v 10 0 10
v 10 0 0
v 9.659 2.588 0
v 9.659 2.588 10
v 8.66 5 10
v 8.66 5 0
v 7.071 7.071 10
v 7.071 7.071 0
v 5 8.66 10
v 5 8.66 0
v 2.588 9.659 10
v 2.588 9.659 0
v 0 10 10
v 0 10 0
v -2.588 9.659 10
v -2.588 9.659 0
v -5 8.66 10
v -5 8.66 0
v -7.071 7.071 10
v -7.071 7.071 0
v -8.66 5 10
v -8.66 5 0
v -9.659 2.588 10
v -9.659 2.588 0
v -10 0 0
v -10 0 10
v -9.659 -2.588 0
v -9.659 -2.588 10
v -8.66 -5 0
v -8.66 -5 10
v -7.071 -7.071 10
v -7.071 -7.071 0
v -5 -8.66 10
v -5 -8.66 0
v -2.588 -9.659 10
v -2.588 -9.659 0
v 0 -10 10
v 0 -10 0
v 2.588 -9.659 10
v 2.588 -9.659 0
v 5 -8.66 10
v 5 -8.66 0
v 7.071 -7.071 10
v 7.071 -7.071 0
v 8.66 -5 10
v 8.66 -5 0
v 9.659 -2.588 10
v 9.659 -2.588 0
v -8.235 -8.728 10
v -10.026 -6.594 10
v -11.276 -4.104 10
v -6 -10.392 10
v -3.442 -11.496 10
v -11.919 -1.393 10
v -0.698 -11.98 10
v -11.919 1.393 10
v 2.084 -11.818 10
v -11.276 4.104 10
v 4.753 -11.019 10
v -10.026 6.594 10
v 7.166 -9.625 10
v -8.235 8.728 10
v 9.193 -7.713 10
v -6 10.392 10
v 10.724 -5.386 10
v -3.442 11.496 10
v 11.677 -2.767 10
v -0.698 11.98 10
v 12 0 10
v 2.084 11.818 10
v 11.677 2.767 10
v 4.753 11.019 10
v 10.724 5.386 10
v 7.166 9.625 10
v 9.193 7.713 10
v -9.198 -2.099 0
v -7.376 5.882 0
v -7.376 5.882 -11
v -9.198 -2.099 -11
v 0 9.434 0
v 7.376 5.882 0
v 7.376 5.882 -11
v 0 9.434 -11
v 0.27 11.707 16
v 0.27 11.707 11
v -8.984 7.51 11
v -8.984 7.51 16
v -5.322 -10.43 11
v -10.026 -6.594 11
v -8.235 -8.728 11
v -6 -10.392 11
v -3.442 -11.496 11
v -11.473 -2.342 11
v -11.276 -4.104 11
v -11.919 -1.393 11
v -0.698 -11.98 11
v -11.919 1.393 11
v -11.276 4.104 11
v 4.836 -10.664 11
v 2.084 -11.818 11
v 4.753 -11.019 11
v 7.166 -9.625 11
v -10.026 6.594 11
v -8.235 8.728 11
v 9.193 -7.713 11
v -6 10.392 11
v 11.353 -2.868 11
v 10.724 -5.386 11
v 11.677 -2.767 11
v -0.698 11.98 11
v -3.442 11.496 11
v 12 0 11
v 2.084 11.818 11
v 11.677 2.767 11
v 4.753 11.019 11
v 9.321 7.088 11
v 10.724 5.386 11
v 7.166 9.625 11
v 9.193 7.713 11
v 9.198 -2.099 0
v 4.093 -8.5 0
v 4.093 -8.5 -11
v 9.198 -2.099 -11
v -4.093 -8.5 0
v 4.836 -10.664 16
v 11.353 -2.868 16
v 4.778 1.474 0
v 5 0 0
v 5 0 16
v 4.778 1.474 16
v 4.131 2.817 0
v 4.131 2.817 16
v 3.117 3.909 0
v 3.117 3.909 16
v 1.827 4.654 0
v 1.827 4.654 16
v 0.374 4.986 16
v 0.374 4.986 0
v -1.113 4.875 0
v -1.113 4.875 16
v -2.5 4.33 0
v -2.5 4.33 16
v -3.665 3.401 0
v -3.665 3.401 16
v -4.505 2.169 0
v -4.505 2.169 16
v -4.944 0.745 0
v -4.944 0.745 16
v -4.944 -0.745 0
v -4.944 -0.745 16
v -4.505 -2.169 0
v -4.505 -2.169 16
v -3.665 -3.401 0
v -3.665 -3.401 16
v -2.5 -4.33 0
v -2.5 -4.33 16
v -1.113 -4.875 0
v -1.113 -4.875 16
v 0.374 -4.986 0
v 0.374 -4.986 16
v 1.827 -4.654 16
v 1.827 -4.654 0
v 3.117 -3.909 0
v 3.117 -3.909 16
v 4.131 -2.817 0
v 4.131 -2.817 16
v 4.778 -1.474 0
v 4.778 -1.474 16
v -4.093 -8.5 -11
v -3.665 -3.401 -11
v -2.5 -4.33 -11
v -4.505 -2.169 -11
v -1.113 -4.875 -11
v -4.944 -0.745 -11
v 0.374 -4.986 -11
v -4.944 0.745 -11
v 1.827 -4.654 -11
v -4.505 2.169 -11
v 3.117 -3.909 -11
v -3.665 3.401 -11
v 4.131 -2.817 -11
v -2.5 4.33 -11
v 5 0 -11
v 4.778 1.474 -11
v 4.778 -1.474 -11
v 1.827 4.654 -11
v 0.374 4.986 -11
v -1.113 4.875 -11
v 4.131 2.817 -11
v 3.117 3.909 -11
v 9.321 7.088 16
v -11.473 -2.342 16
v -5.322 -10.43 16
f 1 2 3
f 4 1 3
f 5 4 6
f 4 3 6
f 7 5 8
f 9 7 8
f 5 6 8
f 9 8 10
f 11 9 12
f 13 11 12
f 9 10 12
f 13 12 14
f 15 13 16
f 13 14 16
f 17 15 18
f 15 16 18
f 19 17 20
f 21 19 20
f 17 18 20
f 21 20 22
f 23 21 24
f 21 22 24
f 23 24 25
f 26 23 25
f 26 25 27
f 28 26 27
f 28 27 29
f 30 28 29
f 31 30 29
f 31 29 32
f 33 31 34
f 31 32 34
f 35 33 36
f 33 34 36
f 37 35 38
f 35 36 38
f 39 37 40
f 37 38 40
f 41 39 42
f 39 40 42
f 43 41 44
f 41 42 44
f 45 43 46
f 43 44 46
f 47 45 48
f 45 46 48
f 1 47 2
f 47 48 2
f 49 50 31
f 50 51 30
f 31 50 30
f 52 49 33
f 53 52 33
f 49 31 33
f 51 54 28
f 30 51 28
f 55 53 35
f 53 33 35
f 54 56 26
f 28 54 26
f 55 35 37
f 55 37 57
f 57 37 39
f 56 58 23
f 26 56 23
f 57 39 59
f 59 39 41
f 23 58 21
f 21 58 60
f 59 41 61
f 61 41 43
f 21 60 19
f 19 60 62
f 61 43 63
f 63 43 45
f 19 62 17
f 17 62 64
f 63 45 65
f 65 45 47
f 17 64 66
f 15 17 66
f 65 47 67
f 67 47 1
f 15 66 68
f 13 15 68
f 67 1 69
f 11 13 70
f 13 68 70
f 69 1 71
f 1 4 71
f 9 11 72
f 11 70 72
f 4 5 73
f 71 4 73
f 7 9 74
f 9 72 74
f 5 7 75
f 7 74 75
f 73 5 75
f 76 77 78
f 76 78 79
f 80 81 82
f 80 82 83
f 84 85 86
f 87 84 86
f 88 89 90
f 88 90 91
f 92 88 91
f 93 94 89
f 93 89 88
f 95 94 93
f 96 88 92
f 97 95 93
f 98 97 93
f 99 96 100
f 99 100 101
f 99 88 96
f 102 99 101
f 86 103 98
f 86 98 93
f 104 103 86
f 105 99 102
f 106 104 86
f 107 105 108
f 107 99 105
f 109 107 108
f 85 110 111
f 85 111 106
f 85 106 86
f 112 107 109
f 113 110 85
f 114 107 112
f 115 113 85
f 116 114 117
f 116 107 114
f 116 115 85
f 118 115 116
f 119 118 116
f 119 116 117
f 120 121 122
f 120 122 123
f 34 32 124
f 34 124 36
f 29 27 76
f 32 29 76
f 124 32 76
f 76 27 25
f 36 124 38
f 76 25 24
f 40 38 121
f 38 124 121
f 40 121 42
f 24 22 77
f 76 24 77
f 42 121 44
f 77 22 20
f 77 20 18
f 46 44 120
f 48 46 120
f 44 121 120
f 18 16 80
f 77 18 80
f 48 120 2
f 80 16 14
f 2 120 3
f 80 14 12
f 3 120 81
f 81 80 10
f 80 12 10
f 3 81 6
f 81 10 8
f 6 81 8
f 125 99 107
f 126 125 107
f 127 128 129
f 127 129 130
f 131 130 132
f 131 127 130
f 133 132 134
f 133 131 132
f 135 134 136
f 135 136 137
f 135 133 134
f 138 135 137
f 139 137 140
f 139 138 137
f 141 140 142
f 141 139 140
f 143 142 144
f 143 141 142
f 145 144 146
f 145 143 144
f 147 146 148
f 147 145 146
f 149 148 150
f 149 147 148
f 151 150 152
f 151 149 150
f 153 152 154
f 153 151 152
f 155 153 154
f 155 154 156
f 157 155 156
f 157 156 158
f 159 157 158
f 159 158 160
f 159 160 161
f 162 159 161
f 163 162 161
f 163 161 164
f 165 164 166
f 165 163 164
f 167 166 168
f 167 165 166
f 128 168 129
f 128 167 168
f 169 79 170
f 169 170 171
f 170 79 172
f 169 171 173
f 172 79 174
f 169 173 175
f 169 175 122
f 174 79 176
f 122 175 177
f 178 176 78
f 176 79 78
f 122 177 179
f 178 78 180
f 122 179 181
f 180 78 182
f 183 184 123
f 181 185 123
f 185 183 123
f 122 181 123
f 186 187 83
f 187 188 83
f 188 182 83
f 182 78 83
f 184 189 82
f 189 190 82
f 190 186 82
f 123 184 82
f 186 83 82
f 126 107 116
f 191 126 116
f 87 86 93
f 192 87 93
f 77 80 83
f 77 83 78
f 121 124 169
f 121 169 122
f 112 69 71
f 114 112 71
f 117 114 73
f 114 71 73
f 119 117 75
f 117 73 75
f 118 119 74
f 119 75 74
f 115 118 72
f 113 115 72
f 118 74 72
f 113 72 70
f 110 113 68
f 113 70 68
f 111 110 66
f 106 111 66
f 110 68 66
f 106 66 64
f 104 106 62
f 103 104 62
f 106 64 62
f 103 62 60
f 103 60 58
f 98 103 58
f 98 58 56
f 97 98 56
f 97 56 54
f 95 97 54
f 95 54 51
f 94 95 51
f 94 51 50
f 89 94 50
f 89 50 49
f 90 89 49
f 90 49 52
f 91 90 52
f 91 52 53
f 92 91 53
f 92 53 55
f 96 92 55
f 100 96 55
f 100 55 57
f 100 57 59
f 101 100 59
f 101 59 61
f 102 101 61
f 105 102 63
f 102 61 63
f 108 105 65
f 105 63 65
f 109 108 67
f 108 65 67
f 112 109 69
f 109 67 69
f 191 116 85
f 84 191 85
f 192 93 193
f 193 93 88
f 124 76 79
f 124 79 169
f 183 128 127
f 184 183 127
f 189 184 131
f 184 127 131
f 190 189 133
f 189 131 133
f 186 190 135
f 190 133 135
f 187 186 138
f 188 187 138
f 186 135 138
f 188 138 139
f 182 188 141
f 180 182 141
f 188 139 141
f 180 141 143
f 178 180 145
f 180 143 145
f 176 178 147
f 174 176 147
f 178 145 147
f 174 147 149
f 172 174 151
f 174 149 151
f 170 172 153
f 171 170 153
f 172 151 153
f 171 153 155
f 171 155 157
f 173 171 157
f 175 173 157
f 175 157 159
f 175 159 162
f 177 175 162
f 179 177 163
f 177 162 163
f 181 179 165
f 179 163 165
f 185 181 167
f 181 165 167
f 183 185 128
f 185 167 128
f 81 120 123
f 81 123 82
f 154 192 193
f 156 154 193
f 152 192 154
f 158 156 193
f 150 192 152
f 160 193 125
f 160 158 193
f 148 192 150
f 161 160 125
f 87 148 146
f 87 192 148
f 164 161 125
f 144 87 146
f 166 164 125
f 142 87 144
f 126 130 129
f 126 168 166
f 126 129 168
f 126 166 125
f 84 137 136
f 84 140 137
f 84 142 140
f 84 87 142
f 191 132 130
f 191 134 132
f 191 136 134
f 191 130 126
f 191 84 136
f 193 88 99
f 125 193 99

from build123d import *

# Parameters (mm, degrees)
F0_R     = 10
F0_R_2   = 5
F1_DEPTH = 16
F0_R_3   = 12
F2_DEPTH = 11
F3_DEPTH = 10
F4_DEPTH = 10
F5_DEPTH = 11


with BuildPart() as f1:
    # F0 (on Top) → F1 (new body)
    with BuildSketch(Plane.XY):
        Polygon((4.8361202547, -10.664289076), (11.3529485972, -2.8680444149), (9.320775088, 7.0878961882), (0.2698678284, 11.7065063948), (-8.9842554103, 7.5098785169), (-11.4730510796, -2.3418410578), (-5.3224052784, -10.4301065511), align=None)
        Circle(F0_R, mode=Mode.SUBTRACT)
        Circle(F0_R)
        Polygon((9.1977509421, -2.0993266316), (4.0933842599, -8.5), (-4.0933842599, -8.5), (-9.1977509421, -2.0993266316), (-7.376023565, 5.8821825089), (0, 9.4342882455), (7.376023565, 5.8821825089), align=None, mode=Mode.SUBTRACT)
        Polygon((-4.0933842599, -8.5), (4.0933842599, -8.5), (9.1977509421, -2.0993266316), (7.376023565, 5.8821825089), (0, 9.4342882455), (-7.376023565, 5.8821825089), (-9.1977509421, -2.0993266316), align=None)
        Circle(F0_R_2, mode=Mode.SUBTRACT)
    extrude(amount=F1_DEPTH)

    # F0 (on Top) → F2 (join)
    with BuildSketch(Plane.XY):
        Circle(F0_R_3)
        Polygon((9.320775088, 7.0878961882), (11.3529485972, -2.8680444149), (4.8361202547, -10.664289076), (-5.3224052784, -10.4301065511), (-11.4730510796, -2.3418410578), (-8.9842554103, 7.5098785169), (0.2698678284, 11.7065063948), align=None, mode=Mode.SUBTRACT)
    extrude(amount=F2_DEPTH)

    # F0 (on Top) → F3 (cut)
    with BuildSketch(Plane.XY):
        Circle(F0_R_3)
        Polygon((9.320775088, 7.0878961882), (11.3529485972, -2.8680444149), (4.8361202547, -10.664289076), (-5.3224052784, -10.4301065511), (-11.4730510796, -2.3418410578), (-8.9842554103, 7.5098785169), (0.2698678284, 11.7065063948), align=None, mode=Mode.SUBTRACT)
    extrude(amount=F3_DEPTH, mode=Mode.SUBTRACT)

    # F0 (on Top) → F4 (cut)
    with BuildSketch(Plane.XY):
        Polygon((4.8361202547, -10.664289076), (11.3529485972, -2.8680444149), (9.320775088, 7.0878961882), (0.2698678284, 11.7065063948), (-8.9842554103, 7.5098785169), (-11.4730510796, -2.3418410578), (-5.3224052784, -10.4301065511), align=None)
        Circle(F0_R, mode=Mode.SUBTRACT)
    extrude(amount=F4_DEPTH, mode=Mode.SUBTRACT)

    # F0 (on Top) → F5 (join)
    with BuildSketch(Plane.XY):
        Polygon((-4.0933842599, -8.5), (4.0933842599, -8.5), (9.1977509421, -2.0993266316), (7.376023565, 5.8821825089), (0, 9.4342882455), (-7.376023565, 5.8821825089), (-9.1977509421, -2.0993266316), align=None)
        Circle(F0_R_2, mode=Mode.SUBTRACT)
    extrude(amount=-F5_DEPTH)


solid = f1.part
